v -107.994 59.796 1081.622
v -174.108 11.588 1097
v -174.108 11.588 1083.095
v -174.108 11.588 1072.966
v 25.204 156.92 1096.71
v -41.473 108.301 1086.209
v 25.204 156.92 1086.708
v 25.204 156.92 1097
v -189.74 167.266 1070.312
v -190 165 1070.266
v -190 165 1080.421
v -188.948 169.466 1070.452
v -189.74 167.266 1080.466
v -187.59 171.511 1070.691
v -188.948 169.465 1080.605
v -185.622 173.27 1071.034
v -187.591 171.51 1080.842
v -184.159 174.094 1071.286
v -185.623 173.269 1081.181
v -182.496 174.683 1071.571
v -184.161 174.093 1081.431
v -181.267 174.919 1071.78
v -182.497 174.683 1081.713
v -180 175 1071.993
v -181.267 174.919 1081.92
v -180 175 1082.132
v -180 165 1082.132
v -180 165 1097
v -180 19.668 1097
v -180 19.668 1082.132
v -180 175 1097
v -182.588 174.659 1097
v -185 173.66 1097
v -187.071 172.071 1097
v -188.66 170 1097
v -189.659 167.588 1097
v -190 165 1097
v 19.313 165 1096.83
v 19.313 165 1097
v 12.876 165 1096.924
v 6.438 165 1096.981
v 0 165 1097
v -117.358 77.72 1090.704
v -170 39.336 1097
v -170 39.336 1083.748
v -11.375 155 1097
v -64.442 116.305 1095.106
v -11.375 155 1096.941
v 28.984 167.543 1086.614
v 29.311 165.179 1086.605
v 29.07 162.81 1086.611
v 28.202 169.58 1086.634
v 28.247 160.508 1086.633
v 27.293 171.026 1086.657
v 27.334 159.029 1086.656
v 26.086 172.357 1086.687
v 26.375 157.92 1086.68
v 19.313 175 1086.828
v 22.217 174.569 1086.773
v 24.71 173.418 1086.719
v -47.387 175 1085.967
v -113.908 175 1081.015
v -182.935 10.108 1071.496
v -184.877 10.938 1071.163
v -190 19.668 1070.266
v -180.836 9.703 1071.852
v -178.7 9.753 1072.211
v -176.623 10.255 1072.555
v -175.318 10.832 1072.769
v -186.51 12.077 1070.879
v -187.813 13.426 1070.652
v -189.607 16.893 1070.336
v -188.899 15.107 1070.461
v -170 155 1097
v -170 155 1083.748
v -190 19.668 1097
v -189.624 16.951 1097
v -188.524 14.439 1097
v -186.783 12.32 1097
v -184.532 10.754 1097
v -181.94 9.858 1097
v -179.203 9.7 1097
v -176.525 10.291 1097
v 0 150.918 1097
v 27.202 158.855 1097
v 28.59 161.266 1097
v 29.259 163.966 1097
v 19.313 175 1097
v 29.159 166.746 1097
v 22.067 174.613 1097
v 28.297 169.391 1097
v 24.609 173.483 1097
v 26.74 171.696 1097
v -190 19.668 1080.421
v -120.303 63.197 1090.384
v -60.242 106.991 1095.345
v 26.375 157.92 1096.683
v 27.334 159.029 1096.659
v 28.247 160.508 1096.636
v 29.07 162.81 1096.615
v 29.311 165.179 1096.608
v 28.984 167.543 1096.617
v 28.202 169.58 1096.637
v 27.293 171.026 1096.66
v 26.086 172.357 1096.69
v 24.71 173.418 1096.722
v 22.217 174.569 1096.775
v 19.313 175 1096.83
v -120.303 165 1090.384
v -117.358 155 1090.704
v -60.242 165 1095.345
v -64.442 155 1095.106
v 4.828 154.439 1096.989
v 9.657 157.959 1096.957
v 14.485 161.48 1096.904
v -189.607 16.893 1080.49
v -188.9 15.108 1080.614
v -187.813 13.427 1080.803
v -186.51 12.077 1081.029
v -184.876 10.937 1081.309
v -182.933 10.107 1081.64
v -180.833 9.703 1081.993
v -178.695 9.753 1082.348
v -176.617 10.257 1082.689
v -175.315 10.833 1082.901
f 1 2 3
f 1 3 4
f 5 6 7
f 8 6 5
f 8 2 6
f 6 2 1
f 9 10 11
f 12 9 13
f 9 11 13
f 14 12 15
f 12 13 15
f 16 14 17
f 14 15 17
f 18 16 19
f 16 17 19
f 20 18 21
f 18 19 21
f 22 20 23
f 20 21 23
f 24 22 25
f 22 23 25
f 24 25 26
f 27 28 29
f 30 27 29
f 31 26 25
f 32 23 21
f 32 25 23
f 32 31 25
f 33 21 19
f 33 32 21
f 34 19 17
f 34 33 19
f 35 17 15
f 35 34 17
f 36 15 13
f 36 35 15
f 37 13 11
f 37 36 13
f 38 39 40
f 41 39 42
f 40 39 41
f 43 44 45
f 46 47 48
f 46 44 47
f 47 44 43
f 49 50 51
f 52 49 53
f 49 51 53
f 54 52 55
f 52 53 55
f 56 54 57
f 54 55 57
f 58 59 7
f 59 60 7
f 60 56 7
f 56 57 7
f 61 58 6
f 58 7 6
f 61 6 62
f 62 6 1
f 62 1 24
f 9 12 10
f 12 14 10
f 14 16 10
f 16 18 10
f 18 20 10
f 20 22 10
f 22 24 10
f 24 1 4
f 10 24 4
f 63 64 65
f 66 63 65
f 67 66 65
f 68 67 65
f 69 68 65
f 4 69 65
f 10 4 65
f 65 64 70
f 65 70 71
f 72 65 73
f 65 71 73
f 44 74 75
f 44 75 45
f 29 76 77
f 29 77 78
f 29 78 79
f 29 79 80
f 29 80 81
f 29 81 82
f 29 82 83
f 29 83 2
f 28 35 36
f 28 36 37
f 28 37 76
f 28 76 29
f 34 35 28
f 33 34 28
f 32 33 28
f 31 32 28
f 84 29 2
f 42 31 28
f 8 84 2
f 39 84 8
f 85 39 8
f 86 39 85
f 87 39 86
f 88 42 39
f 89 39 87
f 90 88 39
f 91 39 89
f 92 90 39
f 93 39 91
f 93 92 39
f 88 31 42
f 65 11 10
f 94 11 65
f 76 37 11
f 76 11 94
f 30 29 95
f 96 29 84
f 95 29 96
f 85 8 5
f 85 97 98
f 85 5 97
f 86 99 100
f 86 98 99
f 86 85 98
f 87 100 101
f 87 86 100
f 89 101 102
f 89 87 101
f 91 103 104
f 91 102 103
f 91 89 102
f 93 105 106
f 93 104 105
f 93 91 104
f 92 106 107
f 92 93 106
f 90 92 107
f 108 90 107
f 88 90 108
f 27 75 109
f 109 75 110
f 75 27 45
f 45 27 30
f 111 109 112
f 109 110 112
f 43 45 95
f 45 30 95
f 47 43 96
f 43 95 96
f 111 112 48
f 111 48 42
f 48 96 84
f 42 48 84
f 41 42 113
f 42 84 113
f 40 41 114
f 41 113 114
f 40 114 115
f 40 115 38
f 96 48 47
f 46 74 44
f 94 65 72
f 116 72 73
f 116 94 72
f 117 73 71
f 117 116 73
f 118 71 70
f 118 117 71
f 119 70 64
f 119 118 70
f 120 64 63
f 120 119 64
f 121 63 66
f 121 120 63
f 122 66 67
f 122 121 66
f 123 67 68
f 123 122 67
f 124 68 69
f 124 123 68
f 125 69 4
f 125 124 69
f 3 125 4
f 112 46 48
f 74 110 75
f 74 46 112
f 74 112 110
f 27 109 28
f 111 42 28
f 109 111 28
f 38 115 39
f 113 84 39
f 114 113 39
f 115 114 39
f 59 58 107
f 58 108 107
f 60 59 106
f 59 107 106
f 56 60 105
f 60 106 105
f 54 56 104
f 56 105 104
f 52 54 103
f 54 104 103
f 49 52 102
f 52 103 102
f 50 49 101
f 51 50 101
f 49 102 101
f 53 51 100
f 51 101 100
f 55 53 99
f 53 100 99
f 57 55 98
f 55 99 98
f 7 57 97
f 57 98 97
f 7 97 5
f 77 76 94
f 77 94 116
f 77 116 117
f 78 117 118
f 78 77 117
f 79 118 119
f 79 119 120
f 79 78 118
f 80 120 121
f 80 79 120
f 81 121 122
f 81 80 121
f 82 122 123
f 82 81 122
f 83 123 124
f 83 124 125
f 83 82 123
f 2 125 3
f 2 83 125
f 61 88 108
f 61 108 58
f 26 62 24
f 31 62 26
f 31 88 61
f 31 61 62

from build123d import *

# Parameters (mm, degrees)
BOSS_EXTRUDE1_DEPTH      = 175
FILLET1_R                = 10
CUT_EXTRUDE3_DEPTH       = 1129.731146152
CUT_EXTRUDE3_DEPTH_BACK  = 1129.731146152
SKETCH4_OUTSIDE_W        = 489.508
SKETCH4_OUTSIDE_H        = 264.508
FILLET4_R                = 10
BOSS_EXTRUDE2_REACH      = 261.692
BOSS_EXTRUDE2_END_RADIUS = 1097
BOSS_EXTRUDE3_REACH      = 261.692
BOSS_EXTRUDE3_END_RADIUS = 1097


with BuildPart() as part:
    # Sketch1 → Boss-Extrude1 (new body)
    with BuildSketch(Plane(origin=(0, 0, 0), x_dir=(1, 0, 0), z_dir=(0, 1, 0))):
        with BuildLine():
            Line((-200, -1068.442324134), (-200, -1078.614388927))
            ThreePointArc((-200, -1078.614388927), (0, -1097), (200, -1078.614388927))
            Line((200, -1078.614388927), (200, -1068.442324134))
            ThreePointArc((200, -1068.442324134), (0, -1087), (-200, -1068.442324134))
        make_face()
    extrude(amount=BOSS_EXTRUDE1_DEPTH)

    # Fillet1
    fillet1_edges = [part.edges().sort_by_distance(p)[0] for p in [
        (200, 175, 1073.52835653),
        (200, 0, 1073.52835653),
        (-200, 0, 1073.52835653),
    ]]
    fillet(fillet1_edges, radius=FILLET1_R)

    # Sketch4 outside → Cut-Extrude3 (cut, two sides: drawn at the far end of the back side and taken through both)
    with BuildSketch(Plane.XY.offset(-CUT_EXTRUDE3_DEPTH_BACK)):
        with Locations((0, 87.5)):
            Rectangle(SKETCH4_OUTSIDE_W, SKETCH4_OUTSIDE_H)
        Polygon((-190, 0), (50, 175), (-190, 175), align=None, mode=Mode.SUBTRACT)
    extrude(amount=CUT_EXTRUDE3_DEPTH + CUT_EXTRUDE3_DEPTH_BACK, mode=Mode.SUBTRACT)

    # Fillet4
    fillet4_edges = [part.edges().sort_by_distance(p)[0] for p in [
        (50, 175, 1090.854686691),
        (-190, 0, 1075.343303099),
        (-190, 175, 1075.343303099),
    ]]
    fillet(fillet4_edges, radius=FILLET4_R)

    # Boss-Extrude2: up to this cylinder (the profile starts outside it)
    boss_extrude2_end = Plane(origin=(0, 92.333894, 0), z_dir=(0, -1, 0)) * Cylinder(BOSS_EXTRUDE2_END_RADIUS, 2718.384, mode=Mode.PRIVATE)
    # Sketch5 → Boss-Extrude2 (add, up to the surface)
    with BuildSketch(Plane.XY.offset(1097), mode=Mode.PRIVATE) as boss_extrude2_sk1:
        with BuildLine():
            Line((-174.108278426, 11.587713648), (25.204468157, 156.919924698))
            ThreePointArc((25.204468157, 156.919924698), (28.820657842, 168.098325917), (19.312746583, 175))
            Line((19.312746583, 175), (-180, 175))
            ThreePointArc((-180, 175), (-187.071067812, 172.071067812), (-190, 165))
            Line((-190, 165), (-190, 19.66778895))
            ThreePointArc((-190, 19.66778895), (-184.53226126, 10.753833158), (-174.108278426, 11.587713648))
        make_face()
        Polygon((-180, 165), (-180, 19.66778895), (19.312746583, 165), align=None, mode=Mode.SUBTRACT)
    boss_extrude2_tool1 = extrude(boss_extrude2_sk1.sketch, amount=-BOSS_EXTRUDE2_REACH, mode=Mode.PRIVATE) - boss_extrude2_end
    add(boss_extrude2_tool1.solids().sort_by_distance((-187.253496, 92.333894, 1097))[0])
    add(boss_extrude2_tool1.solids().sort_by_distance((-187.253496, 92.333894, 1097))[1])

    # Boss-Extrude3: up to this cylinder (the profile starts outside it)
    boss_extrude3_end = Plane(origin=(0, 116.445193, 0), z_dir=(0, -1, 0)) * Cylinder(BOSS_EXTRUDE3_END_RADIUS, 2718.384, mode=Mode.PRIVATE)
    # Sketch6 → Boss-Extrude3 (add, up to the surface)
    with BuildSketch(Plane.XY.offset(1097), mode=Mode.PRIVATE) as boss_extrude3_sk1:
        Polygon((-11.374506835, 155), (-170, 155), (-170, 39.3355779), align=None)
    boss_extrude3_tool1 = extrude(boss_extrude3_sk1.sketch, amount=-BOSS_EXTRUDE3_REACH, mode=Mode.PRIVATE) - boss_extrude3_end
    add(boss_extrude3_tool1.solids().sort_by_distance((-117.124836, 116.445193, 1097))[0])


solid = part.part
